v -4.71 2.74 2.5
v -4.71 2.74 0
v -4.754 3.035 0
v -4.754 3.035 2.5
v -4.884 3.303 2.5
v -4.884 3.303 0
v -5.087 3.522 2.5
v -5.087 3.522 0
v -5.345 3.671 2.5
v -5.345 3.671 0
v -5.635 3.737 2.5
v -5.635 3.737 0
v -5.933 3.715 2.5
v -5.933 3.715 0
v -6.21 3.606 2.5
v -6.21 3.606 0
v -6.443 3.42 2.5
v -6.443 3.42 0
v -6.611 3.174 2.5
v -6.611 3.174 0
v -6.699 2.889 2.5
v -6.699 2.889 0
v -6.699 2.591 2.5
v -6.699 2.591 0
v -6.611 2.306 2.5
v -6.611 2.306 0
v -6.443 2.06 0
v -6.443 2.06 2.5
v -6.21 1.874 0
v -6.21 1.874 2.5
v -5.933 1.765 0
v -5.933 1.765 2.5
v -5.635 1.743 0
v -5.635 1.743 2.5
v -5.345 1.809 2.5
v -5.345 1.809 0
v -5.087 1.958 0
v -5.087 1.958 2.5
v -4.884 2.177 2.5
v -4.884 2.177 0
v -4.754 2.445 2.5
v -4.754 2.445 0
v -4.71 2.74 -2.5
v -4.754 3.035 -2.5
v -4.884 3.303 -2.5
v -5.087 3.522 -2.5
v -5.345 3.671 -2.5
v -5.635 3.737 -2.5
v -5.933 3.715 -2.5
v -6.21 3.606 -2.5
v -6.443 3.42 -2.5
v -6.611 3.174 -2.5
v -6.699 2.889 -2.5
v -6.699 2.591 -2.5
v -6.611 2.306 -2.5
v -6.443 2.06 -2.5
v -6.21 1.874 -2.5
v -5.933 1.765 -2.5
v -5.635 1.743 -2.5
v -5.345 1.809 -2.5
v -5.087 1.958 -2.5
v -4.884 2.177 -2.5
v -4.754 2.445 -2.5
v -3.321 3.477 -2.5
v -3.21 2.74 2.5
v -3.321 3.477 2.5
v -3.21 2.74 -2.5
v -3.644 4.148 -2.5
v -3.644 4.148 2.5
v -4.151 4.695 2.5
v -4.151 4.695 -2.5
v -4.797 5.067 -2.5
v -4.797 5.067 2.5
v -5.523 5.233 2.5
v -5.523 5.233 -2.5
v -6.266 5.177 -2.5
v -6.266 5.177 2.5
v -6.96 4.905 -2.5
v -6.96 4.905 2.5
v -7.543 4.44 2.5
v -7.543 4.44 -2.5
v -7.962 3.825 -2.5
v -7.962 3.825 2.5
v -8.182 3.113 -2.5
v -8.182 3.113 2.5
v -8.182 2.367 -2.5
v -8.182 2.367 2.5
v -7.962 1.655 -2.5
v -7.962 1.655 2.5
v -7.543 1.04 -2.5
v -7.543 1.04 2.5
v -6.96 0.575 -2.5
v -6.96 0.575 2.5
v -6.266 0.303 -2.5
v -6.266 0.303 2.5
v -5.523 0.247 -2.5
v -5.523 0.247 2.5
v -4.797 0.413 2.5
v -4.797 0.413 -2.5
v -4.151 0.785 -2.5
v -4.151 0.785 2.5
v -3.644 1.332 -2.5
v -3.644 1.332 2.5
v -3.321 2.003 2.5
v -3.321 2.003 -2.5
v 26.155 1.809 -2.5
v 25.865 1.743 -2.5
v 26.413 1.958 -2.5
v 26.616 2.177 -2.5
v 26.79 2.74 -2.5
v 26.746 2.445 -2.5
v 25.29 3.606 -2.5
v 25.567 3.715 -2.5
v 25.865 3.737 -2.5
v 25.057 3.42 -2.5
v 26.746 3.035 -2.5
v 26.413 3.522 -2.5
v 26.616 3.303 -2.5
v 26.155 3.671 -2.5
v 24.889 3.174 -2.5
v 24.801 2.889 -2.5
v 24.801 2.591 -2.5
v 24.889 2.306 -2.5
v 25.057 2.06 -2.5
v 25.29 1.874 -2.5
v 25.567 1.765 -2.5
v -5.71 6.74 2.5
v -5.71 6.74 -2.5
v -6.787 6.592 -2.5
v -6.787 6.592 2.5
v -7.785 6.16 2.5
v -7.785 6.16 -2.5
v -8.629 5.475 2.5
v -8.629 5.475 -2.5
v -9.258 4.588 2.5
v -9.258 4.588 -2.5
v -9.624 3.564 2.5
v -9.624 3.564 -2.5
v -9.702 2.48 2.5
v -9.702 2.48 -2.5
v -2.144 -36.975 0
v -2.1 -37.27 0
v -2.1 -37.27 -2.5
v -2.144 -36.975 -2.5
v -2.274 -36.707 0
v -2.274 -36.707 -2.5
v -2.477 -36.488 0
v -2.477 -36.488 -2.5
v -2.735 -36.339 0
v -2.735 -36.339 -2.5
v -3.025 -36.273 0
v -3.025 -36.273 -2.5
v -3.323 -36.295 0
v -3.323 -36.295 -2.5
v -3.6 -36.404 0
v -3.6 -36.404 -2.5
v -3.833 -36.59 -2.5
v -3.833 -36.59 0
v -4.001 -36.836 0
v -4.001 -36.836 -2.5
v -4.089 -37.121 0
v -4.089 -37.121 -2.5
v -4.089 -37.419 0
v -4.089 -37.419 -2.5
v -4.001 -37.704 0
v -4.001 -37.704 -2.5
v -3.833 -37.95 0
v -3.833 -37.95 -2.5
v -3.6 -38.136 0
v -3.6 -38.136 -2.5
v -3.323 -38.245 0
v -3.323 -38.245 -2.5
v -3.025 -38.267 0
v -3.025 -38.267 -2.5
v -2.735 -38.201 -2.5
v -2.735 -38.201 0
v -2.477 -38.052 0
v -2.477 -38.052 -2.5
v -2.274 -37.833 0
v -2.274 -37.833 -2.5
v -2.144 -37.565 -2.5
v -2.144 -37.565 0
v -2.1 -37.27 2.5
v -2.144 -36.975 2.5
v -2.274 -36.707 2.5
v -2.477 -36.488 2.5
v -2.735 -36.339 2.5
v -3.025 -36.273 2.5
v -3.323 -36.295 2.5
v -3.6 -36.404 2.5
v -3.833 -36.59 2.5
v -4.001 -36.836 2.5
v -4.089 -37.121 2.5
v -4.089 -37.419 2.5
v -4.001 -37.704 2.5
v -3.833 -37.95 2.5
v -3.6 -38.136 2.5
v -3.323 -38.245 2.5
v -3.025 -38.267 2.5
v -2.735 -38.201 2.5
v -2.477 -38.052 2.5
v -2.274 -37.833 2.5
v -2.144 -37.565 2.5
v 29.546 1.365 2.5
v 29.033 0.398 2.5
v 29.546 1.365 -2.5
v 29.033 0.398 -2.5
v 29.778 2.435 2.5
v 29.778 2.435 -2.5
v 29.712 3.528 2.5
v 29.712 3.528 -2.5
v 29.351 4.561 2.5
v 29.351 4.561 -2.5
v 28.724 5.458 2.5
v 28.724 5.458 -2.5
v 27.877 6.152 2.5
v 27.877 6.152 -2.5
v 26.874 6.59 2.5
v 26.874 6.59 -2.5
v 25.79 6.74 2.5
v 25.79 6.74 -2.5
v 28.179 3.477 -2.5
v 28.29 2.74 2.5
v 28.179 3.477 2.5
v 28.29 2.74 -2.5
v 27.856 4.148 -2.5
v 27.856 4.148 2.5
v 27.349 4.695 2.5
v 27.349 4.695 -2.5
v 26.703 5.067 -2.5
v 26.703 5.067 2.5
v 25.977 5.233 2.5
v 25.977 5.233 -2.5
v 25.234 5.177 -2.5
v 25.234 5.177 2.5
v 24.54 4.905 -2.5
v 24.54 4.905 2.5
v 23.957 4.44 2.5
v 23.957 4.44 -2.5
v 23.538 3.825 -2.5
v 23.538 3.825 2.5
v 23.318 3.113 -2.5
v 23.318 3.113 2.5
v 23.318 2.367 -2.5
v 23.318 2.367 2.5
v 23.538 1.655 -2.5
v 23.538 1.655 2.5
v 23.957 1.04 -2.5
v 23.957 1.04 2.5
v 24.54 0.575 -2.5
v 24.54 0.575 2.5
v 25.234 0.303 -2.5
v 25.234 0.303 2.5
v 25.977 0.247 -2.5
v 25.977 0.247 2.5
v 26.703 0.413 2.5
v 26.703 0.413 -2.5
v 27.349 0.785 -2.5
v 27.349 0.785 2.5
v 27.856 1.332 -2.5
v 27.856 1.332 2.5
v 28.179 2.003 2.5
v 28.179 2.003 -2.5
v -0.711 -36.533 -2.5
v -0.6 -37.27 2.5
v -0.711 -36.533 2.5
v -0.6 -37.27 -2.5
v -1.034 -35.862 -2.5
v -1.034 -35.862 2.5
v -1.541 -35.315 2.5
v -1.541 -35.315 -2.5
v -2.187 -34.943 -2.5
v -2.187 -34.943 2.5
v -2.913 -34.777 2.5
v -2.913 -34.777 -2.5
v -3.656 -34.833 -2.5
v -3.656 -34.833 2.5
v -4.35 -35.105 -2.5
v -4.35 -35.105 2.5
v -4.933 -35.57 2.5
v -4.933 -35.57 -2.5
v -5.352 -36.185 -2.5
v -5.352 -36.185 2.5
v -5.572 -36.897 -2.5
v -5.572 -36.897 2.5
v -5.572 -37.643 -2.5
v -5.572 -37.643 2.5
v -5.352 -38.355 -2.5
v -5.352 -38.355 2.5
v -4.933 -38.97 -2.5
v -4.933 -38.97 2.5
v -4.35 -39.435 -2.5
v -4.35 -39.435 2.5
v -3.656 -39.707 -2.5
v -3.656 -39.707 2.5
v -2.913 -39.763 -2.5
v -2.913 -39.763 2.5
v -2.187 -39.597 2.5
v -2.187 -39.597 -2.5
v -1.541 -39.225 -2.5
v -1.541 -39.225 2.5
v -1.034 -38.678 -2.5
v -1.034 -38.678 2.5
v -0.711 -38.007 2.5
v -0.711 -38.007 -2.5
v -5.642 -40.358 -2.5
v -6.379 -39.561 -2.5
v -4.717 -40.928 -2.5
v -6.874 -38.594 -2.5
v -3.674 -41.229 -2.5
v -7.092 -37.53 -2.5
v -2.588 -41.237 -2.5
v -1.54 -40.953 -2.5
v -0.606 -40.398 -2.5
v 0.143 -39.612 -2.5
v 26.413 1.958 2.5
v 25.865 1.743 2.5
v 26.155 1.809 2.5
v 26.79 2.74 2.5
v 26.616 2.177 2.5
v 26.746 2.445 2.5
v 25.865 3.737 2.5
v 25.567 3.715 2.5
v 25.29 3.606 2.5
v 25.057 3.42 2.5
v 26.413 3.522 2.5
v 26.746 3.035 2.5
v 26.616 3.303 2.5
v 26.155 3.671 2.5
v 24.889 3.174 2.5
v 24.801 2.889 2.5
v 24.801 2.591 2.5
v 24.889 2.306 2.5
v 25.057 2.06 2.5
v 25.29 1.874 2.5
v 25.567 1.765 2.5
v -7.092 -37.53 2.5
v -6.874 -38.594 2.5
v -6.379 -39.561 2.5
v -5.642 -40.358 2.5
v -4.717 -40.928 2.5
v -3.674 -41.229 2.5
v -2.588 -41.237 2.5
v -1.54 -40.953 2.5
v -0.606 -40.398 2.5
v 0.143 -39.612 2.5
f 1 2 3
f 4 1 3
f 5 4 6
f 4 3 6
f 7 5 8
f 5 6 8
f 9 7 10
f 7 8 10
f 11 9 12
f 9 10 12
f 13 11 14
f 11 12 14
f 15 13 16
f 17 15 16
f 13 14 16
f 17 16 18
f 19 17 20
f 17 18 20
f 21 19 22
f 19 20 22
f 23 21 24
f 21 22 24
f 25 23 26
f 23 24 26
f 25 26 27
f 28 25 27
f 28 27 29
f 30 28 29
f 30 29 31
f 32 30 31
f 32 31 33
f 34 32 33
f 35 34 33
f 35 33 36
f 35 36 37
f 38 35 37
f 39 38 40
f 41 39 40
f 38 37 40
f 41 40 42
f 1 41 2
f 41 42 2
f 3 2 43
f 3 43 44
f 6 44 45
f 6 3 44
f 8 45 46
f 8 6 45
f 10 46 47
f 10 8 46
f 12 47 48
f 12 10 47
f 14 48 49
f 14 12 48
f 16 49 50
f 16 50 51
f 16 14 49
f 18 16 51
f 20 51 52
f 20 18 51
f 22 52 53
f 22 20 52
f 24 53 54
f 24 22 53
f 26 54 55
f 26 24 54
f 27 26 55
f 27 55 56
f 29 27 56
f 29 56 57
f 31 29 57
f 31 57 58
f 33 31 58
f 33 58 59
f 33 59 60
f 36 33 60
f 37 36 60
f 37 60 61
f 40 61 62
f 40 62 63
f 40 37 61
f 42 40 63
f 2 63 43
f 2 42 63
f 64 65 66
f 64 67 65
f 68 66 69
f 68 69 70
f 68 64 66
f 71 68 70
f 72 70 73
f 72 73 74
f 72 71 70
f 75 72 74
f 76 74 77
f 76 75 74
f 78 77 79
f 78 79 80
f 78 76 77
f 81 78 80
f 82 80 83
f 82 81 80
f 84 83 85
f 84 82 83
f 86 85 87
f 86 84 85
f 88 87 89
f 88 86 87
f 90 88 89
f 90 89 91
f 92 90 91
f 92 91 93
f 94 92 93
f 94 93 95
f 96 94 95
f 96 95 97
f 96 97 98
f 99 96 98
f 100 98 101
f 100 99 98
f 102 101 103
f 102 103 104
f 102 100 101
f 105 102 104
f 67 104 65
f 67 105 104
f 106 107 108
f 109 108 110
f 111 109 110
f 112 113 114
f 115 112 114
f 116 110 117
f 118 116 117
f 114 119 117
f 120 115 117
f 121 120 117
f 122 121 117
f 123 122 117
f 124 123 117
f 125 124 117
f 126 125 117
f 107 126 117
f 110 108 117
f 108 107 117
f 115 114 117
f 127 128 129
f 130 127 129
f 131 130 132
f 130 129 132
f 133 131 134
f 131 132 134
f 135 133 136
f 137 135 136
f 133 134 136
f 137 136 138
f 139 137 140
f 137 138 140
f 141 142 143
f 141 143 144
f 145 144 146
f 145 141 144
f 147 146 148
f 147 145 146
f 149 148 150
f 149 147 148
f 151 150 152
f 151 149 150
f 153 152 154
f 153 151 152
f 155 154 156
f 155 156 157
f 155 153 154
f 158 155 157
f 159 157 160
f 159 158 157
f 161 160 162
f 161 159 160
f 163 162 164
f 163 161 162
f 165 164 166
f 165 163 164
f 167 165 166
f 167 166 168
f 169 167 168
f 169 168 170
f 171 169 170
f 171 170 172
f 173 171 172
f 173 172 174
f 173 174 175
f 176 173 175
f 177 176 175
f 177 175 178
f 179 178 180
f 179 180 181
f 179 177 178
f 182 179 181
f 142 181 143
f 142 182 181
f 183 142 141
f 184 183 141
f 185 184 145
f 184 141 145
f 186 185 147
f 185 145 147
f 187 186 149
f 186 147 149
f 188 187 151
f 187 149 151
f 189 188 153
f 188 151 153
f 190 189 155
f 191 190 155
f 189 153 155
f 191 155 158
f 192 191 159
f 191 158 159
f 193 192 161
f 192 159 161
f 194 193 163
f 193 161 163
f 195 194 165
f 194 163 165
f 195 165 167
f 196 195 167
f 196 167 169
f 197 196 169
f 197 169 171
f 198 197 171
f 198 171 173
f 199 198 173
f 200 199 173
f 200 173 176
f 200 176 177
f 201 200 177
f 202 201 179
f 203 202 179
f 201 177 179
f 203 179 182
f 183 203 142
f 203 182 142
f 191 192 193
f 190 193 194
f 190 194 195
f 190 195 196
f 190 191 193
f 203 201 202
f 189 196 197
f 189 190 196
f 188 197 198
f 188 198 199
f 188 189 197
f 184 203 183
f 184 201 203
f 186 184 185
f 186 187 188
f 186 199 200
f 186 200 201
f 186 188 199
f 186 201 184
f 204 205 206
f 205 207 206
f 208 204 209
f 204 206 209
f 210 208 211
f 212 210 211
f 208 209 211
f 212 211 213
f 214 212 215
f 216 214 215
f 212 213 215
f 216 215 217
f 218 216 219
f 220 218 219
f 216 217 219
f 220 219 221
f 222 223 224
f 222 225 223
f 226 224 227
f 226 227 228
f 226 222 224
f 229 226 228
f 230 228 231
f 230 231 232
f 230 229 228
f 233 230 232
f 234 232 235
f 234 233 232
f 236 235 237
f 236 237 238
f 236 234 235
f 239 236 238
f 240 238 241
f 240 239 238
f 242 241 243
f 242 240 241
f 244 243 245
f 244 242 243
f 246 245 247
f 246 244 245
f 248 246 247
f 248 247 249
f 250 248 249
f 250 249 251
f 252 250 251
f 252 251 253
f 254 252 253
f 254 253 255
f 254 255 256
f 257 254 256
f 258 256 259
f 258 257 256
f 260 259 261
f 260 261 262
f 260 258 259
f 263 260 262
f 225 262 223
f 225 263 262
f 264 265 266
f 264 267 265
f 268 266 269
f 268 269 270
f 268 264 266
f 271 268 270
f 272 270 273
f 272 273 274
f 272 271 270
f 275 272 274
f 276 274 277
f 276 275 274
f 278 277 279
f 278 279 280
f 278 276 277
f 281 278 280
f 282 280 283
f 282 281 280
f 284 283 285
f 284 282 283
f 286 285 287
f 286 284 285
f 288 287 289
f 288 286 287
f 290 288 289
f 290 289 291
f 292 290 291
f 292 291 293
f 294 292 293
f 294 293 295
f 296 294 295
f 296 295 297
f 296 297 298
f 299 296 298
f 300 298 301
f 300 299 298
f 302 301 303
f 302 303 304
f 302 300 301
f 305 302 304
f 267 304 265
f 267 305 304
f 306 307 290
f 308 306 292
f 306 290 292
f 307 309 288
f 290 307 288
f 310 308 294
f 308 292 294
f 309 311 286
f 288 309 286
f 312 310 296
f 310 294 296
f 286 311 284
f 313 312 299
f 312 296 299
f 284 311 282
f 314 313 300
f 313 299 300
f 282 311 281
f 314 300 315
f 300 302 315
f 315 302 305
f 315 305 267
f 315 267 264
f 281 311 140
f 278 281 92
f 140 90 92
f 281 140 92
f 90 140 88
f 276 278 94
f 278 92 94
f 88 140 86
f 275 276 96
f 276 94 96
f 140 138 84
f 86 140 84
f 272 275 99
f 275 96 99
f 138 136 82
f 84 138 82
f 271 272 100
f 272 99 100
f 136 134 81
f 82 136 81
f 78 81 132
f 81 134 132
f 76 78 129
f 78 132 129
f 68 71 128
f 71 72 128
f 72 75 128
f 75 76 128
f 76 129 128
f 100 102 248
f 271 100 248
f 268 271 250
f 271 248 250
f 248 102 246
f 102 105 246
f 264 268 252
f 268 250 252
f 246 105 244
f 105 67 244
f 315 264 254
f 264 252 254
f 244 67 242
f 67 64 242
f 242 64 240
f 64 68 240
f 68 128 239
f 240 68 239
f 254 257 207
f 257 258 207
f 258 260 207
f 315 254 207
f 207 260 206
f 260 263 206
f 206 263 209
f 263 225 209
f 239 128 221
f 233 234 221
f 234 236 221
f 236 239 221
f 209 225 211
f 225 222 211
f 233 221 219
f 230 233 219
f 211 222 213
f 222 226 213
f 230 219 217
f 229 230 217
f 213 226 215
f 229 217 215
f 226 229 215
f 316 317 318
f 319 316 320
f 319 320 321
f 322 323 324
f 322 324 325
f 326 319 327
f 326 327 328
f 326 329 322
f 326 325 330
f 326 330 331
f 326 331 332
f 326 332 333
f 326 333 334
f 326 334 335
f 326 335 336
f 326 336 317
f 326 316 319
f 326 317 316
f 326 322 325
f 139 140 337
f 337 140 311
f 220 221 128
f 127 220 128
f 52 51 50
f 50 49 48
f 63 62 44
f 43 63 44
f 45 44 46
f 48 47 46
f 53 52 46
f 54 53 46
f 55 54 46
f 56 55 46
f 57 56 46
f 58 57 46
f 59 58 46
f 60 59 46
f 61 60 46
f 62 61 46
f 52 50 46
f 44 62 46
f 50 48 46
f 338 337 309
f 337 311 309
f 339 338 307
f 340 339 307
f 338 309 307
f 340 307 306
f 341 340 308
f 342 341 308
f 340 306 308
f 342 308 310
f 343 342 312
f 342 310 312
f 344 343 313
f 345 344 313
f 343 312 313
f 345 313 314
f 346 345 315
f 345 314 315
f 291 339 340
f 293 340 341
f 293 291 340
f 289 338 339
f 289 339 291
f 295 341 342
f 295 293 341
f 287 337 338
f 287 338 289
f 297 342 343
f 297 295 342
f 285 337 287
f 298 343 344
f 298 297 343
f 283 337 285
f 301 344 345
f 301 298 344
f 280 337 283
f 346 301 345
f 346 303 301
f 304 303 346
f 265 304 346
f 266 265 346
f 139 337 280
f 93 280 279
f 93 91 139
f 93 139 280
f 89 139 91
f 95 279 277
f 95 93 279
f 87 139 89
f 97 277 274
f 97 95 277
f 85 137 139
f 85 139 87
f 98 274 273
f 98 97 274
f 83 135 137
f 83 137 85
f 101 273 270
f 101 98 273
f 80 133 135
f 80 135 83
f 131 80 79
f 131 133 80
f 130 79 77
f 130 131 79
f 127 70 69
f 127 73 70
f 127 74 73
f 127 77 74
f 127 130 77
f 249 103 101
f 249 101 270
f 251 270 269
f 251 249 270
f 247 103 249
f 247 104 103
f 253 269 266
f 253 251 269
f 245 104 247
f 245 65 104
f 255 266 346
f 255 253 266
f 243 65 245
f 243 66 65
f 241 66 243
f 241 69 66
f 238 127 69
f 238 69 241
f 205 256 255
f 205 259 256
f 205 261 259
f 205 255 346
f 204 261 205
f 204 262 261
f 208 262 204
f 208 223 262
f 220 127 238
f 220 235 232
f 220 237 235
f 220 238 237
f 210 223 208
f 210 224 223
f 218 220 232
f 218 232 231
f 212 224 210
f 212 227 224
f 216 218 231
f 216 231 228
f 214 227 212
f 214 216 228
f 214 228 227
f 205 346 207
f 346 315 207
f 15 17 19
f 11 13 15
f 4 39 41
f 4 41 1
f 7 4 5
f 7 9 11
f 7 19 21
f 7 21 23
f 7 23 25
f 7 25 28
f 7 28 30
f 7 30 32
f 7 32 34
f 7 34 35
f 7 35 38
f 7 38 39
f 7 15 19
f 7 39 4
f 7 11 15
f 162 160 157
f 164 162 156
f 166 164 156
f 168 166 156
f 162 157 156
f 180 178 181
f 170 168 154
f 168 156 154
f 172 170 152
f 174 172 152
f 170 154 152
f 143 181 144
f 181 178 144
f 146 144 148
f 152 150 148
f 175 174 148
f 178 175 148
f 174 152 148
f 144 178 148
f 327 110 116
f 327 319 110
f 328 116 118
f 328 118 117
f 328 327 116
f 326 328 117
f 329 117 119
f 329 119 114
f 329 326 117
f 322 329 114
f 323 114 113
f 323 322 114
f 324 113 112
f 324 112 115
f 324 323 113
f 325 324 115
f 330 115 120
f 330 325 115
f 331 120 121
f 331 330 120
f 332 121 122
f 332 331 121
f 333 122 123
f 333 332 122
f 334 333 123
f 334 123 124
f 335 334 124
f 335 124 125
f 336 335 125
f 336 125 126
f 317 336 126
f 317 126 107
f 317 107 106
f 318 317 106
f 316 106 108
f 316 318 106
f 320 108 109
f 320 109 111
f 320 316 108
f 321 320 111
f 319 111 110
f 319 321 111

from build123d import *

# Parameters (mm, degrees)
F0_R     = 2.5
F0_R_2   = 1
F1_DEPTH = 2.5


with BuildPart() as f1:
    # F0 (on Top) → F1 (new body, symmetric)
    with BuildSketch(Plane.XY):
        with BuildLine():
            Line((-9.701516, 2.479619), (-7.091516, -37.530381))
            ThreePointArc((-7.091516, -37.530381), (-4.20589, -41.114087), (0.142952, -39.611637))
            Line((0.142952, -39.611637), (29.032952, 0.398363))
            ThreePointArc((29.032952, 0.398363), (29.351358, 4.561188), (25.79, 6.74))
            Line((25.79, 6.74), (-5.71, 6.74))
            ThreePointArc((-5.71, 6.74), (-8.629035, 5.474819), (-9.701516, 2.479619))
        make_face()
        with Locations((-3.1, -37.27)):
            Circle(F0_R, mode=Mode.SUBTRACT)
        with Locations((-5.71, 2.74)):
            Circle(F0_R, mode=Mode.SUBTRACT)
        with Locations((25.79, 2.74)):
            Circle(F0_R, mode=Mode.SUBTRACT)
        with Locations((-5.71, 2.74)):
            Circle(F0_R_2)
        with Locations((-3.1, -37.27)):
            Circle(F0_R_2)
        with Locations((25.79, 2.74)):
            Circle(F0_R_2)
    extrude(amount=F1_DEPTH, both=True)


solid = f1.part
